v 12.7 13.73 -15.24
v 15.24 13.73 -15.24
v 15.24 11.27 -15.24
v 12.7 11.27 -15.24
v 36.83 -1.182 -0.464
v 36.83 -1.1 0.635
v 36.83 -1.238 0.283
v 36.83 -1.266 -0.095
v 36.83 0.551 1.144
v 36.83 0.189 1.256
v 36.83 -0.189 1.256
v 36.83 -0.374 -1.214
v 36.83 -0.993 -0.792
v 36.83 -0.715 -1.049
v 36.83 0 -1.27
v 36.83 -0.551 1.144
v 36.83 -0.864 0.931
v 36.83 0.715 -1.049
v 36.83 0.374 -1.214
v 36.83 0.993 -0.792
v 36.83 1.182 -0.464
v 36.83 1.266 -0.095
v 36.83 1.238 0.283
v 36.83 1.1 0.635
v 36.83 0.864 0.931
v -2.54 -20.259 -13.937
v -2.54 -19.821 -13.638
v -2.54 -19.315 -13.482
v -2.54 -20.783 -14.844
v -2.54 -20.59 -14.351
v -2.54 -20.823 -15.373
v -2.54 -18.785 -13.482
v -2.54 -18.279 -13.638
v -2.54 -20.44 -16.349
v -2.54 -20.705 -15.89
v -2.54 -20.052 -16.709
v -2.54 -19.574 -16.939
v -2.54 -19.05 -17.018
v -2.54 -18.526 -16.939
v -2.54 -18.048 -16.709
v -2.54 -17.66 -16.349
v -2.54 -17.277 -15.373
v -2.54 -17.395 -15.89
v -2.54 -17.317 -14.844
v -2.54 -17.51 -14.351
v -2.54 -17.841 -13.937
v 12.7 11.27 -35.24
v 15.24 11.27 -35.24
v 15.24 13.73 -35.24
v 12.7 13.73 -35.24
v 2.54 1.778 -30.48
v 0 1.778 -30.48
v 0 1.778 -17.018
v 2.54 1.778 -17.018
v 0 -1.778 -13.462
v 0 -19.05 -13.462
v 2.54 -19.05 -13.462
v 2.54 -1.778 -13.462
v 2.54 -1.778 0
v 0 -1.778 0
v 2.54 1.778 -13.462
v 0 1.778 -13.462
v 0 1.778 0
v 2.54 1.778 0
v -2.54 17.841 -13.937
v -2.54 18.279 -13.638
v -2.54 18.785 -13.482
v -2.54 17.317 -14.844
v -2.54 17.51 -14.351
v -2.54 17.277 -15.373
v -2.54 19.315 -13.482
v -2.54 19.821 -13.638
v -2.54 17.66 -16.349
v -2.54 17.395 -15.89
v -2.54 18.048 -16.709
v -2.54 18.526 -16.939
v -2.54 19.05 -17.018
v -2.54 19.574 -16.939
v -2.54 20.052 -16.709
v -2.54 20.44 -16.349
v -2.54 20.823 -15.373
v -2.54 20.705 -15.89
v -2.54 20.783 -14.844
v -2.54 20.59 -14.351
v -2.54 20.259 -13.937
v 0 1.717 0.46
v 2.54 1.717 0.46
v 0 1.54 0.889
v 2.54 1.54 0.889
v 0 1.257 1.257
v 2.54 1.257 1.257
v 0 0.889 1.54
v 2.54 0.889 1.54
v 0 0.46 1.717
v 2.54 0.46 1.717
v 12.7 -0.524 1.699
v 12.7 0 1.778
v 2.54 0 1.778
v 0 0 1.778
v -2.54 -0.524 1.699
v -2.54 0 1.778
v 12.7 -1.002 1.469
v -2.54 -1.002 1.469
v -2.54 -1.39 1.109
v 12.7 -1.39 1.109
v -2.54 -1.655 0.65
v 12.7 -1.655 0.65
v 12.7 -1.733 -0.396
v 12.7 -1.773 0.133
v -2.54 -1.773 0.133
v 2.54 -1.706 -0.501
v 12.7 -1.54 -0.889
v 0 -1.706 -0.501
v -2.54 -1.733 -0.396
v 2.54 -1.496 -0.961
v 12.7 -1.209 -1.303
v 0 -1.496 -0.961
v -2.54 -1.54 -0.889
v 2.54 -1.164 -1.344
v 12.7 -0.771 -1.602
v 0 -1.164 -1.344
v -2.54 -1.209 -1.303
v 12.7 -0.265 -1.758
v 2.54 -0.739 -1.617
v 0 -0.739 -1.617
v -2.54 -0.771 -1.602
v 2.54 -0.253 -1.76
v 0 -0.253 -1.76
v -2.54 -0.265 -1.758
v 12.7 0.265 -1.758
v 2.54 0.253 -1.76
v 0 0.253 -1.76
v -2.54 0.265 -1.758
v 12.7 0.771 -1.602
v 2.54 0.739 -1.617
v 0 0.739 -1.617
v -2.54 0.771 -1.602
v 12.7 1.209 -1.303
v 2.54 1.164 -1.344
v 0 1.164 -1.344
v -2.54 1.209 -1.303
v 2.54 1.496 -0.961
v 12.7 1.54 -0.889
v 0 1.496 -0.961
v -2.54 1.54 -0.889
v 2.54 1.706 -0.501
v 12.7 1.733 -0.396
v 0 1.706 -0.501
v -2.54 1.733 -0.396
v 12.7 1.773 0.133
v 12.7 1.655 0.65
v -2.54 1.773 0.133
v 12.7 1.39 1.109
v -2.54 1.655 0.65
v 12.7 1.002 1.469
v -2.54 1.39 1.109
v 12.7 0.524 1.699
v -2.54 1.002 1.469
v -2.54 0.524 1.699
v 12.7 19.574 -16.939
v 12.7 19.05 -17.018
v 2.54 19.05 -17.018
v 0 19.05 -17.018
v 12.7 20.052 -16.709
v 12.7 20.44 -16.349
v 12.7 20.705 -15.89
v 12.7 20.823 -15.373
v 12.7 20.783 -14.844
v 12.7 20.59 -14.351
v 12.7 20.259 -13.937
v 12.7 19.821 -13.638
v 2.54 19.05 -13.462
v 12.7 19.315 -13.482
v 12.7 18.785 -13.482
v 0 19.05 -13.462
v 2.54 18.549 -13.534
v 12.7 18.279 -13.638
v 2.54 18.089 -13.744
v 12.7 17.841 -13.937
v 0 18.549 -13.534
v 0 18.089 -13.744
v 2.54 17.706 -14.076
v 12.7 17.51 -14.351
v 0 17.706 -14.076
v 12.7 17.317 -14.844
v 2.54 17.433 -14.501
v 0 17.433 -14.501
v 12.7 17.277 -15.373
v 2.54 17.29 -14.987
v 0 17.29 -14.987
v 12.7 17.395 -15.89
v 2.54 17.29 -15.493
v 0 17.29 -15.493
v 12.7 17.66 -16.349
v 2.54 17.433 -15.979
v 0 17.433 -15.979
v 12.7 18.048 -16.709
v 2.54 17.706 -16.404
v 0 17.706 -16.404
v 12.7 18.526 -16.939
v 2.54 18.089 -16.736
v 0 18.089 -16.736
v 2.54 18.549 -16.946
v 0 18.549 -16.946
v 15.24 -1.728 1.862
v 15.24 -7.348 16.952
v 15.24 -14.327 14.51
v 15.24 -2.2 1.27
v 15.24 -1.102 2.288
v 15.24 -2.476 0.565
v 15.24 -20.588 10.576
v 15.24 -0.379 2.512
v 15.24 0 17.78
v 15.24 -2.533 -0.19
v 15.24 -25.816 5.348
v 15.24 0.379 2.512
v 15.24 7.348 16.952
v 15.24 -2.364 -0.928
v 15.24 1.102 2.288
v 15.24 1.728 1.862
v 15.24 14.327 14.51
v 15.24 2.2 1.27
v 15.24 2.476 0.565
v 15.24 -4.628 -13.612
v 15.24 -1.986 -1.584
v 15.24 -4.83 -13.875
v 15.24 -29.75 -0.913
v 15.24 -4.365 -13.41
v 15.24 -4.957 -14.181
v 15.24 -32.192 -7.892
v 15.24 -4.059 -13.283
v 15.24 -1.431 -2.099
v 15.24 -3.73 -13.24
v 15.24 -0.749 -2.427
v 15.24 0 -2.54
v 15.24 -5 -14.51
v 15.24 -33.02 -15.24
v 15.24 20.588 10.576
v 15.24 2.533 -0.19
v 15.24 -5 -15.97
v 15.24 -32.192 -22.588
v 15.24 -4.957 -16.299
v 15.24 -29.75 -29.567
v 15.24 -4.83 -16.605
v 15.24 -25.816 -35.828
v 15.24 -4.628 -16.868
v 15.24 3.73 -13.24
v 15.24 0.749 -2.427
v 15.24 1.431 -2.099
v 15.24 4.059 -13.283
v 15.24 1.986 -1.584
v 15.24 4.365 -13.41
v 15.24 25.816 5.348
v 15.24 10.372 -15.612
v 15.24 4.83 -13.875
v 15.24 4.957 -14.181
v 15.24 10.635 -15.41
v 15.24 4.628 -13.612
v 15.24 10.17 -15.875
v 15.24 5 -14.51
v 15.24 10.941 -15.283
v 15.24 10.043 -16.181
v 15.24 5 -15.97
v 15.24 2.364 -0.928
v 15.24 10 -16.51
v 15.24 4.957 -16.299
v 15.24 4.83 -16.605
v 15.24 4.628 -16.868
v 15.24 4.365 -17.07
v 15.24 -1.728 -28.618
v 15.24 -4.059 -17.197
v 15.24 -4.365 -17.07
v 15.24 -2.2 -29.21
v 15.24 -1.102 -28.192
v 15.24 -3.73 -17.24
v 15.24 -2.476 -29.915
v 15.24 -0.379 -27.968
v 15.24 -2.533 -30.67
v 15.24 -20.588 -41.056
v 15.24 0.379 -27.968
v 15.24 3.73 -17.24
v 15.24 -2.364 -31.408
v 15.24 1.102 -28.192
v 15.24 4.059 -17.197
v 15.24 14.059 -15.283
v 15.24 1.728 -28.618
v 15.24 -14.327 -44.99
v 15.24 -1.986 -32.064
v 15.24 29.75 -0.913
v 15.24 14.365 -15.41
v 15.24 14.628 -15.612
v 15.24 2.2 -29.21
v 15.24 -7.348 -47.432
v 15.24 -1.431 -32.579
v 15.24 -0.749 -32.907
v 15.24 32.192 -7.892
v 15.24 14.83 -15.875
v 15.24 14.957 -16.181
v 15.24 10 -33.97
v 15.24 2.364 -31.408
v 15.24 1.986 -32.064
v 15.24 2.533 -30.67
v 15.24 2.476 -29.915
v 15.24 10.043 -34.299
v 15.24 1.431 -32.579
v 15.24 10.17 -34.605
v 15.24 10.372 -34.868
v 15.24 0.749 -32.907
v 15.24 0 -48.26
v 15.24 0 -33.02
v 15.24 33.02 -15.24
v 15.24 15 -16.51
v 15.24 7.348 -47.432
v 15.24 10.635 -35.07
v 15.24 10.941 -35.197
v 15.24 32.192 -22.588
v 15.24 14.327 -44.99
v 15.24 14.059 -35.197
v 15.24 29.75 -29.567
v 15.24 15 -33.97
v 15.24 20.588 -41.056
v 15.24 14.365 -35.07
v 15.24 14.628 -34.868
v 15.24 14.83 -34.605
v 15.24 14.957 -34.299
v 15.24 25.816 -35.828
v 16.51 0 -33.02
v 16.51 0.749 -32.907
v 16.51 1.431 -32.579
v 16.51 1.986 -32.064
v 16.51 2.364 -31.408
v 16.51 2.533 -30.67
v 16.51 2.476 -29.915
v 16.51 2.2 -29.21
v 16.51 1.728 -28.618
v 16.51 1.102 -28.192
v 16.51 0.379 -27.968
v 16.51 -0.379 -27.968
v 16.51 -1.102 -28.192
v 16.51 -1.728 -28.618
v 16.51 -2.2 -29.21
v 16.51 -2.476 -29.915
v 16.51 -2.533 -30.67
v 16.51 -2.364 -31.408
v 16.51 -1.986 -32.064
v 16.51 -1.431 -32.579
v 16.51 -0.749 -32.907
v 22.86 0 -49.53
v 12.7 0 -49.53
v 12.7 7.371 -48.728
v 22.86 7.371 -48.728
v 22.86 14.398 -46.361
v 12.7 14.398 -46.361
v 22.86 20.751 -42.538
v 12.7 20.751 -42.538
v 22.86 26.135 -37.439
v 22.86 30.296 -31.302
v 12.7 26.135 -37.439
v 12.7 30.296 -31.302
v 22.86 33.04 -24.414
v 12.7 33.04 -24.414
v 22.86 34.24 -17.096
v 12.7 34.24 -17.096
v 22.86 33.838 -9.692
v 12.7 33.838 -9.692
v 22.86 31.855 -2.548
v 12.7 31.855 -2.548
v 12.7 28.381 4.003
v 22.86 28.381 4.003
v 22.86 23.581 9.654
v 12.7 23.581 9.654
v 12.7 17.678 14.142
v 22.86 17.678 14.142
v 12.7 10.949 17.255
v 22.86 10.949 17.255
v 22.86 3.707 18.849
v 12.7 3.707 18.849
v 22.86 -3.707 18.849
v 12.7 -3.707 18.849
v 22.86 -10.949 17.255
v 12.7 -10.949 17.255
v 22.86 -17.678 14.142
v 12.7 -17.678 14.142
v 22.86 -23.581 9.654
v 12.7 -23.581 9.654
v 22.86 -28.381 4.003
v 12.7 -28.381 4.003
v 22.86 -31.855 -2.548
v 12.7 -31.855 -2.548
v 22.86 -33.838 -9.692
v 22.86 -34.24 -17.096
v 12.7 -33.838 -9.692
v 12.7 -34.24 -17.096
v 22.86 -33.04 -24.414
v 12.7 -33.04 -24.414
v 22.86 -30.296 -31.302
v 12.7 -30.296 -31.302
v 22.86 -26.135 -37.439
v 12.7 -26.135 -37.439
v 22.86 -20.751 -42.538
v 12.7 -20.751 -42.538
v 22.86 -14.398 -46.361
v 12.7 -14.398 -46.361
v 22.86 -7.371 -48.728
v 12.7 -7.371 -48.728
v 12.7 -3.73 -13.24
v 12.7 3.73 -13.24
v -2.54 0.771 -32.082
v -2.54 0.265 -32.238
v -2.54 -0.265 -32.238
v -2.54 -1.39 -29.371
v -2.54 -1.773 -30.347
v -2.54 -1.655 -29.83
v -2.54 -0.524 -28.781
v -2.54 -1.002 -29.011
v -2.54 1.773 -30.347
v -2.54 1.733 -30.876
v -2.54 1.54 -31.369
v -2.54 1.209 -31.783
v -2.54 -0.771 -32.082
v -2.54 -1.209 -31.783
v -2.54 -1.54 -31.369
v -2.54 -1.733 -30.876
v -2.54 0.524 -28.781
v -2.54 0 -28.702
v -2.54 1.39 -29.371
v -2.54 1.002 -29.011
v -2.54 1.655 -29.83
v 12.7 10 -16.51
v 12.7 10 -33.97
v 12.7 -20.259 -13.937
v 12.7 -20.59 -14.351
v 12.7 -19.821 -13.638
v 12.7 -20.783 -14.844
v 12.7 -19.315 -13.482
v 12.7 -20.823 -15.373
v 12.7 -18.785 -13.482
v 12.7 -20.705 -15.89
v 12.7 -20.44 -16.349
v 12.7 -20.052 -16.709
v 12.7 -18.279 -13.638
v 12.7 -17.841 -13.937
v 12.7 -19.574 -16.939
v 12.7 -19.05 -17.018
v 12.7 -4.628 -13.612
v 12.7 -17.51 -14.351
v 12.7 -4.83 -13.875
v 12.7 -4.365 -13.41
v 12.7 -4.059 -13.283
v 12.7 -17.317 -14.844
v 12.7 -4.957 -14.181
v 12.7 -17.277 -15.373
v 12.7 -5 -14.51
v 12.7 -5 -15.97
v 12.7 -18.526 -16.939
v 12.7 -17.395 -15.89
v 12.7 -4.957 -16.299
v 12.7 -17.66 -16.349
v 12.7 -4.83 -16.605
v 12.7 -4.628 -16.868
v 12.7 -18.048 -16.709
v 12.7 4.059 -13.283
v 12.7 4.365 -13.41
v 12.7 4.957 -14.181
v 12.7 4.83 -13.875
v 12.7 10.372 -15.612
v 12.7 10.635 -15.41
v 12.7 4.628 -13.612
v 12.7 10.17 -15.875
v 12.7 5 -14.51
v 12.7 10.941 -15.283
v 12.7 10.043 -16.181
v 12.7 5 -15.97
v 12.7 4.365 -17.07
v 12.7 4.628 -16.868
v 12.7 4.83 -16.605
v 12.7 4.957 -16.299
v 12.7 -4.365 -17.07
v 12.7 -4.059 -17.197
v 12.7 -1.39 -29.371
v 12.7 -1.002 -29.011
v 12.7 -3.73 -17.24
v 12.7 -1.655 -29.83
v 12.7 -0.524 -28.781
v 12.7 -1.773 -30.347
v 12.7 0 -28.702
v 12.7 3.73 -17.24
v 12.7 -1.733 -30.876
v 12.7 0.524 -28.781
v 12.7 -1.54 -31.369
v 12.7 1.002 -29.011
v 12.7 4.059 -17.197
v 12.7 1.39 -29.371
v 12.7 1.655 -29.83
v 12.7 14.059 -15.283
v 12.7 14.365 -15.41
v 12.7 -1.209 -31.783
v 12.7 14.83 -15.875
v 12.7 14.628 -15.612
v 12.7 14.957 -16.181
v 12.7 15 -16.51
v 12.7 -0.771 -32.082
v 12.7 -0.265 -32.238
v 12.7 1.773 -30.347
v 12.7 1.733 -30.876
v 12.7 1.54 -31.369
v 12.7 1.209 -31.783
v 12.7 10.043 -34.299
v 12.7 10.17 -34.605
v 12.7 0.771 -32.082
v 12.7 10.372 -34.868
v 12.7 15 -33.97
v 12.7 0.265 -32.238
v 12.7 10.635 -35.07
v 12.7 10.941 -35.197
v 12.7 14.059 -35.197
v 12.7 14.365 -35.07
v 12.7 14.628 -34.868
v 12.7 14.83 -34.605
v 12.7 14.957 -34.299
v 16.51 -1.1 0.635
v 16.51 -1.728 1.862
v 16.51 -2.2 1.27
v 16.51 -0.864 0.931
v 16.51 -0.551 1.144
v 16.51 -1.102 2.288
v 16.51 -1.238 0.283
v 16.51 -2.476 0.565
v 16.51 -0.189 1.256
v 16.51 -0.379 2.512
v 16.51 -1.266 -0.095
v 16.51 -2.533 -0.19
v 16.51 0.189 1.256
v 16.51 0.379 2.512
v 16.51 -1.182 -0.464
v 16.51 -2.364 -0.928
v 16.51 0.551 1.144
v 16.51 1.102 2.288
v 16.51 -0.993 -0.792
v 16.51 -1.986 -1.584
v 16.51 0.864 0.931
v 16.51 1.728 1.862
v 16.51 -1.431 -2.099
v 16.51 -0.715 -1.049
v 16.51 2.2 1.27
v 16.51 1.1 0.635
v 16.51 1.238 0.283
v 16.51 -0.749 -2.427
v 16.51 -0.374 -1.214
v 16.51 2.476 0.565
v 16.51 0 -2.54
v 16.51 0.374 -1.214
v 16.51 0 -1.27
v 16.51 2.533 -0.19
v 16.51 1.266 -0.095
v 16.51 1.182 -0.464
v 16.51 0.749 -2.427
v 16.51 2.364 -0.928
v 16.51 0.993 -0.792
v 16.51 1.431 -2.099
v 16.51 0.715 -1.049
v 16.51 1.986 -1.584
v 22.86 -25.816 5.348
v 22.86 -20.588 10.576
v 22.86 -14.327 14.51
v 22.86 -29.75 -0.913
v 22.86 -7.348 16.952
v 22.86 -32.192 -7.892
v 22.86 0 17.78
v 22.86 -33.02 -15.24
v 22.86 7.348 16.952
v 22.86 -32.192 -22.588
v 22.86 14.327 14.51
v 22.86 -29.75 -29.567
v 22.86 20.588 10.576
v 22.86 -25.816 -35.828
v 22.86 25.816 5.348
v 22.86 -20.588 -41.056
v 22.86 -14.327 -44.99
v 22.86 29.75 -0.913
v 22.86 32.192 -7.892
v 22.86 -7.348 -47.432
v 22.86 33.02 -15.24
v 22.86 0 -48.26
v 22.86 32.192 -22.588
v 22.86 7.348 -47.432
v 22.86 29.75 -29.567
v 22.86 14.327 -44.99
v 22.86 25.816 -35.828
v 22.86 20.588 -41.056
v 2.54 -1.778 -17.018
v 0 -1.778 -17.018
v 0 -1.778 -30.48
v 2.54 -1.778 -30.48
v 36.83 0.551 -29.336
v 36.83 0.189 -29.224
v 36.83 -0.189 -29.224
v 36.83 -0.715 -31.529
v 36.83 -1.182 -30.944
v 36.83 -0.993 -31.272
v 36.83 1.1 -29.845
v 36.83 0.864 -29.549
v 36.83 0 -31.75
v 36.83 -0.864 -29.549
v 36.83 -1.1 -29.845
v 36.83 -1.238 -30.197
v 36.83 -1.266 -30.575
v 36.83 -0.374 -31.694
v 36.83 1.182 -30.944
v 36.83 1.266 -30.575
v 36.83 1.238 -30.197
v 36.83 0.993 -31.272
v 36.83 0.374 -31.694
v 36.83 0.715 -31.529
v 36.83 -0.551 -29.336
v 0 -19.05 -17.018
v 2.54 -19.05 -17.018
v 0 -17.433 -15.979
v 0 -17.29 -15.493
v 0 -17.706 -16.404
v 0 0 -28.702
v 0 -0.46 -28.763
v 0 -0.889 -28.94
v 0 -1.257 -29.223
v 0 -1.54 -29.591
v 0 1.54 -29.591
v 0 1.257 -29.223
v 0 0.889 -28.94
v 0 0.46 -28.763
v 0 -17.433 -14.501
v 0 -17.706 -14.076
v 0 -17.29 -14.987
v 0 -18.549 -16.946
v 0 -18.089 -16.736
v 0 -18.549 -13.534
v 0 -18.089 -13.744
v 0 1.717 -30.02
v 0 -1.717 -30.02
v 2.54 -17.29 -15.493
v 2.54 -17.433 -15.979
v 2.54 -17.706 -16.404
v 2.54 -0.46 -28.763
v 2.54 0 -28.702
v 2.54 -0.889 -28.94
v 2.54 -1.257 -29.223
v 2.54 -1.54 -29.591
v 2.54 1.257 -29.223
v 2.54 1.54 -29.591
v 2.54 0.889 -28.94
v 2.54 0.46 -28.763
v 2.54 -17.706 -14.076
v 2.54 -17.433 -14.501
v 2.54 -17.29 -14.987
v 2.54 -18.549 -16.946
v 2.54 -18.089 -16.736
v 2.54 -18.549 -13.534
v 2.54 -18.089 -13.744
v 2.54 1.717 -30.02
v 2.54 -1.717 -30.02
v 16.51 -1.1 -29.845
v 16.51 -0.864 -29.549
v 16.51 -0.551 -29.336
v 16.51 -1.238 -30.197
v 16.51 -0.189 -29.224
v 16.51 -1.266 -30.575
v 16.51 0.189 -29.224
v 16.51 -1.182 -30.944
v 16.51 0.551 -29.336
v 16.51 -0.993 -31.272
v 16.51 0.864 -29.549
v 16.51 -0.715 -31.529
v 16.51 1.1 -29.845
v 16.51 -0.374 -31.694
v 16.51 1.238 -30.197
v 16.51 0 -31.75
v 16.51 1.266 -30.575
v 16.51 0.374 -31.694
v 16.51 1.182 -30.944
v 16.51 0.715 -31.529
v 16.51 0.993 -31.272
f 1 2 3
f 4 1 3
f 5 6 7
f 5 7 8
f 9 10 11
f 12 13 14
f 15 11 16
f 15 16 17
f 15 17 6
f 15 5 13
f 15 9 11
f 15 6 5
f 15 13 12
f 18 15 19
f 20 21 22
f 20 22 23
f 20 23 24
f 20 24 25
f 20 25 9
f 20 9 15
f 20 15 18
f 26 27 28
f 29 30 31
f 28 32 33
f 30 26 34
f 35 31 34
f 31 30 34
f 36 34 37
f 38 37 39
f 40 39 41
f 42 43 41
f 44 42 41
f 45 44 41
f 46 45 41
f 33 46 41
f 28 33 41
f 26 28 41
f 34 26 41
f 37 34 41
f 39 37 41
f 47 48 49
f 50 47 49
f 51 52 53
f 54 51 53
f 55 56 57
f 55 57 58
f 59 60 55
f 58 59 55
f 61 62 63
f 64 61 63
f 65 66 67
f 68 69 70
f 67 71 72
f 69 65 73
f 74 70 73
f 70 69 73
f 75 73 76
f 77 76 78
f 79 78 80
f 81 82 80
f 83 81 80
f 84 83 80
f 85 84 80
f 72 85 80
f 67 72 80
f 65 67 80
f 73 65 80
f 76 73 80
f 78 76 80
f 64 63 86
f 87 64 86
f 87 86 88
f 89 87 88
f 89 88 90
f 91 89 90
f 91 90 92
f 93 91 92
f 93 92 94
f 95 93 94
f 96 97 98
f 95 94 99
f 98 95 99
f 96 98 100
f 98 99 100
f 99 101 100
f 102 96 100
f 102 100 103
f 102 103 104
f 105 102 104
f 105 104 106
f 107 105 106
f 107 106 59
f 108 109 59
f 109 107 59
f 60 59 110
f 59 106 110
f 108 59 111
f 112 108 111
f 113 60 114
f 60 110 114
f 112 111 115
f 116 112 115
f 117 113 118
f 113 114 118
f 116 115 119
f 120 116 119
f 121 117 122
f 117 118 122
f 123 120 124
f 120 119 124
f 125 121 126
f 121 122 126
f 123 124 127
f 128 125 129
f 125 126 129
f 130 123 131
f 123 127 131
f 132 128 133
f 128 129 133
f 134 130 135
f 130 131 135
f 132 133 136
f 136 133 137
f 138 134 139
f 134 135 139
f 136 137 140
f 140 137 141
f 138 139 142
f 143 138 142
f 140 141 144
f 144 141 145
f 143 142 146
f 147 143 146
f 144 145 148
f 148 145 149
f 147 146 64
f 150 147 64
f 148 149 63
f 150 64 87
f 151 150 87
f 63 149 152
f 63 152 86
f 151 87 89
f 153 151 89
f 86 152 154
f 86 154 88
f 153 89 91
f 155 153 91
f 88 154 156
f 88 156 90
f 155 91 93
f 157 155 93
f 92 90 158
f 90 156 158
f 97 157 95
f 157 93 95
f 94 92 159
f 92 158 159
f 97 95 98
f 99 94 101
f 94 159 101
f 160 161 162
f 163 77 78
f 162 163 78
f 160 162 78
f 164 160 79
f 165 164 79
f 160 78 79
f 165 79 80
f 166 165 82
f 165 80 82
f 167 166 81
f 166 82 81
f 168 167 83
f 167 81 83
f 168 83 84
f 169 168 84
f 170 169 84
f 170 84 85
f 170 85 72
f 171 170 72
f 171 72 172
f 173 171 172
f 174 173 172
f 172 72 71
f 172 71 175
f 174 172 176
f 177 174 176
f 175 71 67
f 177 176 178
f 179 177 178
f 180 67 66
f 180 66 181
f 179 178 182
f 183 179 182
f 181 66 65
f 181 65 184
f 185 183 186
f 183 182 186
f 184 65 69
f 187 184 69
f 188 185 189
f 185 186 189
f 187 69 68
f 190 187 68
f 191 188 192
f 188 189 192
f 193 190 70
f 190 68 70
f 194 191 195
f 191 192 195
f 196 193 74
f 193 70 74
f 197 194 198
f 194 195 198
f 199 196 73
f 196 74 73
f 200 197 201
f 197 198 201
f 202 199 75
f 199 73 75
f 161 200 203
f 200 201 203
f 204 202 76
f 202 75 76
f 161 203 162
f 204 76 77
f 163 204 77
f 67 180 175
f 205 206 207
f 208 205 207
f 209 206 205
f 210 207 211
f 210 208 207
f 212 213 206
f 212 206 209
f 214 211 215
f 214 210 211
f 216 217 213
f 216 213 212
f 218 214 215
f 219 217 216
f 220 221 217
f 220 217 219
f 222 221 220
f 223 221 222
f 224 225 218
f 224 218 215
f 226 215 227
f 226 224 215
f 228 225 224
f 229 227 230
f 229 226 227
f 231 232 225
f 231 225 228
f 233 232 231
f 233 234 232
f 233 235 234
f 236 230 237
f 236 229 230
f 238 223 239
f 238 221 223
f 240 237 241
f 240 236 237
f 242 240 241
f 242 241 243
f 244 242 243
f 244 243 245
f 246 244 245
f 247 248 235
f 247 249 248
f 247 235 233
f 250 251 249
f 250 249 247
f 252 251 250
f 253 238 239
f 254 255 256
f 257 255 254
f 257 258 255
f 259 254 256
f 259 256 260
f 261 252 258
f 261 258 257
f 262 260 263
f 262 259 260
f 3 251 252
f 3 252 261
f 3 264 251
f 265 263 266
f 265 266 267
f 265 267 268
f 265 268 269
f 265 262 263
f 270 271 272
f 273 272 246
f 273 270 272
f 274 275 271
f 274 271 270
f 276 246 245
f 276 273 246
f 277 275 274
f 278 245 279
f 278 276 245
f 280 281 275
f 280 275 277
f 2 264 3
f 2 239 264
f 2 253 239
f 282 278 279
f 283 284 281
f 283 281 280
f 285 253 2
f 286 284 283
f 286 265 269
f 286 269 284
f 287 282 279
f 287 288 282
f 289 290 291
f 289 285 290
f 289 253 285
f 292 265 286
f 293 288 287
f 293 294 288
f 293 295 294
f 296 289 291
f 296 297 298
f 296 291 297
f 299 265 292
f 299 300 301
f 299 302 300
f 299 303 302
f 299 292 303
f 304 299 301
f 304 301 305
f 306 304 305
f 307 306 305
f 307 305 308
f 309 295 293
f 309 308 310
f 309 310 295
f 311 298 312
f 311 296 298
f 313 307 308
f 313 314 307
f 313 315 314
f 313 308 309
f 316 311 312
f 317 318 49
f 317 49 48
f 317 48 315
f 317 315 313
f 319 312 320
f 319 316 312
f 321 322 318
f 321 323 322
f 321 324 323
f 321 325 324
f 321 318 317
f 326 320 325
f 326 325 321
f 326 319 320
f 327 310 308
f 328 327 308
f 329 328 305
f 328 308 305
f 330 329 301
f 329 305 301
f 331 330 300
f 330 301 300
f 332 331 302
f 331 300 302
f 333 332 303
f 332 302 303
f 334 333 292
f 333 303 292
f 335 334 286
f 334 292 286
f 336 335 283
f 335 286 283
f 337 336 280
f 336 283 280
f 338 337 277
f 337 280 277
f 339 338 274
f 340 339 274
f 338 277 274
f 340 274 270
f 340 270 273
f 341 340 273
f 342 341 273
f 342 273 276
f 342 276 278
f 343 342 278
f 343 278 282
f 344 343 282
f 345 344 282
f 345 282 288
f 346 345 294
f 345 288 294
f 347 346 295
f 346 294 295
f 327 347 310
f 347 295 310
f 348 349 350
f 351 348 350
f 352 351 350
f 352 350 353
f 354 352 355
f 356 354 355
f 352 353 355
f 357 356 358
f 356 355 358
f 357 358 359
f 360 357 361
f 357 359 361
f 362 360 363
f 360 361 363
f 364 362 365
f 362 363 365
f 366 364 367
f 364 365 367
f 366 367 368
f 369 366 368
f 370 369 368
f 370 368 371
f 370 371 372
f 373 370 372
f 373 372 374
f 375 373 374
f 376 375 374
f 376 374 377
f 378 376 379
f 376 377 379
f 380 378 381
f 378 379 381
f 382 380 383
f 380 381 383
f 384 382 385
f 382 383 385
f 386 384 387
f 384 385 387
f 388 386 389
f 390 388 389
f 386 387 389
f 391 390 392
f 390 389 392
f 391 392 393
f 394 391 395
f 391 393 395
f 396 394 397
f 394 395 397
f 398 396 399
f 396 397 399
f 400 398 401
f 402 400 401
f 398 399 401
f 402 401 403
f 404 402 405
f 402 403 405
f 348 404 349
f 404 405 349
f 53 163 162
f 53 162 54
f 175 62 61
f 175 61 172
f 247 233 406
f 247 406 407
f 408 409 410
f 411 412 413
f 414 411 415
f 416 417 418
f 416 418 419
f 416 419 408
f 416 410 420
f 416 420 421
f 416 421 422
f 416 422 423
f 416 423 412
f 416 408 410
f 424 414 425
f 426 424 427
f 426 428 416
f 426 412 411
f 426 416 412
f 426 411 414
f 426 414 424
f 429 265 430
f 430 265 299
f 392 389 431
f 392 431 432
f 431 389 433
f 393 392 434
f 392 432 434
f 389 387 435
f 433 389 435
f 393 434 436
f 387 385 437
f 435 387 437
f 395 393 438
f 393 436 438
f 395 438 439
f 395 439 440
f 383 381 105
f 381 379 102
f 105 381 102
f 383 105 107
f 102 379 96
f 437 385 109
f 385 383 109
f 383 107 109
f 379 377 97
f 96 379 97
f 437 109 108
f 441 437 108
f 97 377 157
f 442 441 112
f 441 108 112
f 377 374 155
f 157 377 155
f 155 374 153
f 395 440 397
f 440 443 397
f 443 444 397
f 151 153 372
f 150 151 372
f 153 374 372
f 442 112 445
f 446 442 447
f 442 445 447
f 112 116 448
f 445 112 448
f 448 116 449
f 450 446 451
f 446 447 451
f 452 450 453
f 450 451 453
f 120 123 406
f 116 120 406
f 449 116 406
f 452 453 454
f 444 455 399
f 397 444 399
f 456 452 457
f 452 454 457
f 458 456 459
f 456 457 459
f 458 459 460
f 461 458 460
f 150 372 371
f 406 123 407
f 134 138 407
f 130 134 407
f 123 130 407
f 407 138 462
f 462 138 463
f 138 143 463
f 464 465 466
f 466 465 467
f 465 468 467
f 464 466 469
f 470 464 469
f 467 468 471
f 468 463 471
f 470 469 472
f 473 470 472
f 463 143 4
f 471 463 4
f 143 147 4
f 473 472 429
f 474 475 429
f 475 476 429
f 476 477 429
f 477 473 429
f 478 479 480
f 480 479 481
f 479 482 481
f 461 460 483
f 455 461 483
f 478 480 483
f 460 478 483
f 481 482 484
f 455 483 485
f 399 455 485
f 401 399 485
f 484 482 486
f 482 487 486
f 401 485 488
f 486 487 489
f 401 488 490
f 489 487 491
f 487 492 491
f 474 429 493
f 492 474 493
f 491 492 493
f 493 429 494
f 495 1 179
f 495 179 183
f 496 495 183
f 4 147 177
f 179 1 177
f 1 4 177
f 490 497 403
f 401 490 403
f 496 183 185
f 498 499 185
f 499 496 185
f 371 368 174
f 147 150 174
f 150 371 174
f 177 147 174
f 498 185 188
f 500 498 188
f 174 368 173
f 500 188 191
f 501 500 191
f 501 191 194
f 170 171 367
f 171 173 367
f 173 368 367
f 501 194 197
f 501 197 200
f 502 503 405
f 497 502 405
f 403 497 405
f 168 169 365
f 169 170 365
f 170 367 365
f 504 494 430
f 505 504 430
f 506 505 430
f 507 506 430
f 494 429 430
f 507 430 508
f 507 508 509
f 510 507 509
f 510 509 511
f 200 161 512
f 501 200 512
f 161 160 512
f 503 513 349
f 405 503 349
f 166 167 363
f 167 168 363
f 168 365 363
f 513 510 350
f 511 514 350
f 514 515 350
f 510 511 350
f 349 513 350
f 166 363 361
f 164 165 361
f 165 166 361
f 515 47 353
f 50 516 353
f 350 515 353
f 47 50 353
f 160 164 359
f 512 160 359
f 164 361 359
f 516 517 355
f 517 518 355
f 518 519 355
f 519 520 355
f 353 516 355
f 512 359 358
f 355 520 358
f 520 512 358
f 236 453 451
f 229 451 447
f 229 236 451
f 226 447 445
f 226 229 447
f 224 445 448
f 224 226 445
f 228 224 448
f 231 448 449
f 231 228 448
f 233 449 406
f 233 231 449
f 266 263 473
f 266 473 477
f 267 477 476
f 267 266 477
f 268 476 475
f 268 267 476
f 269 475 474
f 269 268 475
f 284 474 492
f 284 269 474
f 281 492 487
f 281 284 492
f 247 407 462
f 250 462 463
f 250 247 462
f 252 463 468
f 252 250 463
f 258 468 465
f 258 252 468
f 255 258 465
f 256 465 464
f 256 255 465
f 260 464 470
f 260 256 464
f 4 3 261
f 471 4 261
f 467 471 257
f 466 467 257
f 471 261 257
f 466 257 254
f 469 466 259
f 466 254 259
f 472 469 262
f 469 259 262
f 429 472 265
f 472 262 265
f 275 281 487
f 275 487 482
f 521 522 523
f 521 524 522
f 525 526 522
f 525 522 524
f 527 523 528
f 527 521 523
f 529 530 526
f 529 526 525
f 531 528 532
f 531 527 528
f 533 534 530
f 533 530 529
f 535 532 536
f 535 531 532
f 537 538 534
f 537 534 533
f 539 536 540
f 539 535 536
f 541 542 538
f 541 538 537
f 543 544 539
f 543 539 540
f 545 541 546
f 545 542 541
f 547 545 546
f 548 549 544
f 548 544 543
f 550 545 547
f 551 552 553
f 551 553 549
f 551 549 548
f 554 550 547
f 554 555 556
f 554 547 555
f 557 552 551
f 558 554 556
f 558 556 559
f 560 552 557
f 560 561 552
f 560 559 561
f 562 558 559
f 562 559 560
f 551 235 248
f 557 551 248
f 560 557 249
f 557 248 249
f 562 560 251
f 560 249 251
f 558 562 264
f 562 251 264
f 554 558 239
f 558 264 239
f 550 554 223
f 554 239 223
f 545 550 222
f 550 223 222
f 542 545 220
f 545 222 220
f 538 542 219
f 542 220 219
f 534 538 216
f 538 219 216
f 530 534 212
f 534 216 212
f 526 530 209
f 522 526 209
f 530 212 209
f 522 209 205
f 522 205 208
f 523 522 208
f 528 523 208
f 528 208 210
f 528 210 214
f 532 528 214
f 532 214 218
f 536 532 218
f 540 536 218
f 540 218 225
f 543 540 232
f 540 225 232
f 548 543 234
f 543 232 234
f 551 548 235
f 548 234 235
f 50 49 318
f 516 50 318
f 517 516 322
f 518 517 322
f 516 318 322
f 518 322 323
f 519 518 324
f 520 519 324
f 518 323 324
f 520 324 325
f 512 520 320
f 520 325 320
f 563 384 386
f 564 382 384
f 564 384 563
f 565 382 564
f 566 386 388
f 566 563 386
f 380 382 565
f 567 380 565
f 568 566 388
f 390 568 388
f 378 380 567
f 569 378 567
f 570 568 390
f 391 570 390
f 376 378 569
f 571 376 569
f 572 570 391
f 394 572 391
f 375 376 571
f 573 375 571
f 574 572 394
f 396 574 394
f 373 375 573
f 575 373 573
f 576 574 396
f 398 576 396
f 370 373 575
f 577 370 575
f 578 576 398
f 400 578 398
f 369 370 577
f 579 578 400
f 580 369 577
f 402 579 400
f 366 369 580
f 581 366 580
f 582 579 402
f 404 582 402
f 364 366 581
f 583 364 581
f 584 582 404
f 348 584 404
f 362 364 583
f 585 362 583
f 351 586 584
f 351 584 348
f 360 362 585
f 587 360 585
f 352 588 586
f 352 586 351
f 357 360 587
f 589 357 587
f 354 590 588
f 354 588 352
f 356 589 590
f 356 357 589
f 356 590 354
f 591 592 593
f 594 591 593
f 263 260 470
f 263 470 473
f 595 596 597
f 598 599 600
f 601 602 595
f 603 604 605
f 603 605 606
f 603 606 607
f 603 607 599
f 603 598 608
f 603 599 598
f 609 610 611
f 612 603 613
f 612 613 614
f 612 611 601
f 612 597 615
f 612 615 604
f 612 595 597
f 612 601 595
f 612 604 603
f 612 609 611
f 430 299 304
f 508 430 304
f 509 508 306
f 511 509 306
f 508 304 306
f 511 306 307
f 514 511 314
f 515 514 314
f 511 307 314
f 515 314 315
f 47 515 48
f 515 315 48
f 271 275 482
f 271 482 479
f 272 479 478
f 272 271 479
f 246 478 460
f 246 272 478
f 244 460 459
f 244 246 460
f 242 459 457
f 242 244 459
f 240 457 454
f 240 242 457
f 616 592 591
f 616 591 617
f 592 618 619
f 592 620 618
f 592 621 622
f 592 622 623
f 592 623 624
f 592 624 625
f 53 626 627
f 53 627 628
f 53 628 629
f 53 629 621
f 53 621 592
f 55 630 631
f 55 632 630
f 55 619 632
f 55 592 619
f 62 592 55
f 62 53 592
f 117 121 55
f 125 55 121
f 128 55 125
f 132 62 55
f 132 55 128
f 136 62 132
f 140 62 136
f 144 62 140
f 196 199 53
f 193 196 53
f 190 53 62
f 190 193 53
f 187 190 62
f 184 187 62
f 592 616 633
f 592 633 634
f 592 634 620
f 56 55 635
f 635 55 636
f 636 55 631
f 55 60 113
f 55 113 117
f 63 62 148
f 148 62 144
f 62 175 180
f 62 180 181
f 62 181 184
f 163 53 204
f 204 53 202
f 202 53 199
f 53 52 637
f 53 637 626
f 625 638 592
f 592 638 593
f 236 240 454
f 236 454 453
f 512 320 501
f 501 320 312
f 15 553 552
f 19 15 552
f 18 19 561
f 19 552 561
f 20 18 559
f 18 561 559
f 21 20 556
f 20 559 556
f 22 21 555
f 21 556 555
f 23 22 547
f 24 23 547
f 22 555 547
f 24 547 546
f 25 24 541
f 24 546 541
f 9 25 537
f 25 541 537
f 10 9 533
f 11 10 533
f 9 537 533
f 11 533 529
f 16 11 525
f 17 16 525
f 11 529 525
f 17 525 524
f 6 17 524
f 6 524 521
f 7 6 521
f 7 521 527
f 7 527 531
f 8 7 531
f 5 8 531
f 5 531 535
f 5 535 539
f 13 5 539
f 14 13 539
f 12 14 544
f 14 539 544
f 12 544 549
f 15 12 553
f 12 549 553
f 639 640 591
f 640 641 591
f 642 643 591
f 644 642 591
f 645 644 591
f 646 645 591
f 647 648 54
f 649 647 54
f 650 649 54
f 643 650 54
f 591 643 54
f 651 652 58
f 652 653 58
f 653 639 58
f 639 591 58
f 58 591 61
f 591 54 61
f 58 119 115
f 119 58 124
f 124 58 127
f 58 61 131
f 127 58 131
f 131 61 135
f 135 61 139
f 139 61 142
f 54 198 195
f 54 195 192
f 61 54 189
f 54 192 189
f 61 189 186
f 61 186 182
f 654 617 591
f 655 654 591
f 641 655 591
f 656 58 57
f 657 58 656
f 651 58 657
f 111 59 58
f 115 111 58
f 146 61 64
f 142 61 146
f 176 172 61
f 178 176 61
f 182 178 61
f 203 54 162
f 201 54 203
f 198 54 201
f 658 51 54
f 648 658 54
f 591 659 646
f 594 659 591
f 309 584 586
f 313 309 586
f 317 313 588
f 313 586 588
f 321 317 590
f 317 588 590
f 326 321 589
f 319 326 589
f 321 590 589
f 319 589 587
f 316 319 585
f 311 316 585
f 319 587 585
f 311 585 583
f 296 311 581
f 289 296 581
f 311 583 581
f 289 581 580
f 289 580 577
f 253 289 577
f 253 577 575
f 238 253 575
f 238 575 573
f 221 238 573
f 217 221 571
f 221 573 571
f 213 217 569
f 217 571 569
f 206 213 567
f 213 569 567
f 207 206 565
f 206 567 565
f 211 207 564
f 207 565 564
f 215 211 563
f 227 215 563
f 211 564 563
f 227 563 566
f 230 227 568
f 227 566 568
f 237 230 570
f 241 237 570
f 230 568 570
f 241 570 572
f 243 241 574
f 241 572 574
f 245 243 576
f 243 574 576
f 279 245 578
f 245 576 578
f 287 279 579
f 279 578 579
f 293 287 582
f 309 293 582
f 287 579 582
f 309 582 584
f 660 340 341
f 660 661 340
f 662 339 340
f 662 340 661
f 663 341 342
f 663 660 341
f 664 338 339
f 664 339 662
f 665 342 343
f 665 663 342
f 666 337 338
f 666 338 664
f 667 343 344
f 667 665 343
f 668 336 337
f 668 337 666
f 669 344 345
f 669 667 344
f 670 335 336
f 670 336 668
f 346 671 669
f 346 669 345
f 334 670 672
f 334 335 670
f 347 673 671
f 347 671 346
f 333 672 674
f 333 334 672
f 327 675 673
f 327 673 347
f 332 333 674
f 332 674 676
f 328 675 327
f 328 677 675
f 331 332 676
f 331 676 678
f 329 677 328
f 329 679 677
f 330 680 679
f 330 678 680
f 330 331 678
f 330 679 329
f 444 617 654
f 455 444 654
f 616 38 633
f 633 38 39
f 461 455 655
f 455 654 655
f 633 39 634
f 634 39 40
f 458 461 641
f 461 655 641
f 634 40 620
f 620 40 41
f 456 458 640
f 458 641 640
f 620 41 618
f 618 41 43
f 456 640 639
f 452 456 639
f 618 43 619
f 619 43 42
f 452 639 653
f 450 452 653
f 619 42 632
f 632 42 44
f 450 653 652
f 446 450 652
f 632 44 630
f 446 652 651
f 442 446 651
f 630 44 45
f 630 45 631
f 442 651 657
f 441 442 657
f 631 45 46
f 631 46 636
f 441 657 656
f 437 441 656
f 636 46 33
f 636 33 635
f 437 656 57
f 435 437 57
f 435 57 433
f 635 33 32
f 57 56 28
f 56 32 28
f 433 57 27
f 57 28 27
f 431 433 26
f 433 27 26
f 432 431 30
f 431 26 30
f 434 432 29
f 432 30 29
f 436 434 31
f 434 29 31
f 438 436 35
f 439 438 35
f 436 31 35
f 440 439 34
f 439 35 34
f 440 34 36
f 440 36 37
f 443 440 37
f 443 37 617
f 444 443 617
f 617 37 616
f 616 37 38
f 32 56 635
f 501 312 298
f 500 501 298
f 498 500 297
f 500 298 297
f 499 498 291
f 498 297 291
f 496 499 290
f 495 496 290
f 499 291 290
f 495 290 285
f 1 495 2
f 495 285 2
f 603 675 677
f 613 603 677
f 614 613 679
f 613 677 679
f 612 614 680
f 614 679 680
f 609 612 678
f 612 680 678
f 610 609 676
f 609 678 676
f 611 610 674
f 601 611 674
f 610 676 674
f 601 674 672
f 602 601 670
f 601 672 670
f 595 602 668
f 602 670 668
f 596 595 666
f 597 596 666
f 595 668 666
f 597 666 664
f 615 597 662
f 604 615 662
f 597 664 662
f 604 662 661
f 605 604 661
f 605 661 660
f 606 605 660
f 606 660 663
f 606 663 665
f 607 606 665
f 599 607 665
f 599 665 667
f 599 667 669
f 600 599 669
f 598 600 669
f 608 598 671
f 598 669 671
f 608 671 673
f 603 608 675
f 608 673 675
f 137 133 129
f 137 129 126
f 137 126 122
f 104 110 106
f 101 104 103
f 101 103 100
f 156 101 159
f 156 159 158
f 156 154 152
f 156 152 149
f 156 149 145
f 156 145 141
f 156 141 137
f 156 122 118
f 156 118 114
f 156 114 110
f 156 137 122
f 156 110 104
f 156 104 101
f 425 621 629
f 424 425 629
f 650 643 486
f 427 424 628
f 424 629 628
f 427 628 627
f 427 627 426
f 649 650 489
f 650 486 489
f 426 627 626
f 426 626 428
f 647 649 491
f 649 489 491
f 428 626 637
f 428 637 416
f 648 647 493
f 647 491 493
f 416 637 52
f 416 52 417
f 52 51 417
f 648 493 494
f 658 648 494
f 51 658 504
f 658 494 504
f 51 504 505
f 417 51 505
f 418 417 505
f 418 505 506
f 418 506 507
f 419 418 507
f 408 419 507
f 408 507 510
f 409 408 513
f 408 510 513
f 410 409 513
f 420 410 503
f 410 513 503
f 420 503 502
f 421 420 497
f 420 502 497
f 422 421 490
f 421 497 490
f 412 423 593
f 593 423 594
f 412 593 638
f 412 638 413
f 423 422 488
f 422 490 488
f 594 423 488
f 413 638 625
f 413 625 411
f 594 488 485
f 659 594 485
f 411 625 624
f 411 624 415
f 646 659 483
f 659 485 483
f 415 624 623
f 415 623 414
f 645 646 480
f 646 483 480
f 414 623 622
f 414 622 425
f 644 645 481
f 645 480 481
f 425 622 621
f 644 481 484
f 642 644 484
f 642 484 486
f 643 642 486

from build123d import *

# Parameters (mm, degrees)
BOSS_EXTRUDE1_DEPTH      = 2.54
BOSS_EXTRUDE2_DEPTH      = 2.54
BOSS_EXTRUDE2_DEPTH_BACK = 12.7
SKETCH3_R                = 1.778
SKETCH4_R                = 34.29
BOSS_EXTRUDE3_DEPTH      = 10.16
BOSS_EXTRUDE4_DEPTH      = 2.54
BOSS_EXTRUDE5_DEPTH      = 10.16
BOSS_EXTRUDE5_DEPTH_BACK = 5.08
SKETCH6_R                = 1.778
SKETCH7_R                = 33.02
CUT_EXTRUDE1_DEPTH       = 7.62
SKETCH9_R                = 2.54
BOSS_EXTRUDE6_DEPTH      = 1.27
SKETCH10_R               = 1.27
BOSS_EXTRUDE7_DEPTH      = 20.32
CUT_EXTRUDE2_REACH       = 65.993
CUT_EXTRUDE3_REACH       = 65.993


with BuildPart() as part:
    # Sketch2 → Boss-Extrude1 (new body)
    with BuildSketch(Plane(origin=(0, 0, 0), x_dir=(0, 0, -1), z_dir=(1, 0, 0))):
        with BuildLine():
            Line((0, -1.778), (30.48, -1.778))
            ThreePointArc((30.48, -1.778), (32.258, 0), (30.48, 1.778))
            Line((30.48, 1.778), (0, 1.778))
            ThreePointArc((0, 1.778), (-1.778, 0), (0, -1.778))
        make_face()
    extrude(amount=BOSS_EXTRUDE1_DEPTH)

    # Sketch3 → Boss-Extrude2 (add, two sides: drawn at the far end of the back side and taken through both)
    with BuildSketch(Plane.ZY.offset(-BOSS_EXTRUDE2_DEPTH_BACK)):
        with Locations((-30.48, 0)):
            Circle(SKETCH3_R)
        Circle(SKETCH3_R)
    extrude(amount=BOSS_EXTRUDE2_DEPTH + BOSS_EXTRUDE2_DEPTH_BACK)

    # Sketch4 → Boss-Extrude3 (add)
    with BuildSketch(Plane(origin=(12.7, 0, 0), x_dir=(0, 0, -1), z_dir=(1, 0, 0))):
        with Locations((15.24, 0)):
            Circle(SKETCH4_R)
    extrude(amount=BOSS_EXTRUDE3_DEPTH)

    # Sketch5 → Boss-Extrude4 (add)
    with BuildSketch(Plane(origin=(0, 0, 0), x_dir=(0, 0, -1), z_dir=(1, 0, 0))):
        with BuildLine():
            Line((13.462, -19.05), (13.462, 19.05))
            ThreePointArc((13.462, 19.05), (15.24, 20.828), (17.018, 19.05))
            Line((17.018, 19.05), (17.018, -19.05))
            ThreePointArc((17.018, -19.05), (15.24, -20.828), (13.462, -19.05))
        make_face()
    extrude(amount=BOSS_EXTRUDE4_DEPTH)

    # Sketch6 → Boss-Extrude5 (add, two sides: drawn at the far end of the back side and taken through both)
    with BuildSketch(Plane(origin=(2.54, 0, 0), x_dir=(0, 0, -1), z_dir=(1, 0, 0)).offset(-BOSS_EXTRUDE5_DEPTH_BACK)):
        with Locations((15.24, -19.05)):
            Circle(SKETCH6_R)
        with Locations((15.24, 19.05)):
            Circle(SKETCH6_R)
    extrude(amount=BOSS_EXTRUDE5_DEPTH + BOSS_EXTRUDE5_DEPTH_BACK)

    # Sketch7 → Cut-Extrude1 (cut)
    with BuildSketch(Plane(origin=(22.86, 0, 0), x_dir=(0, 0, -1), z_dir=(1, 0, 0))):
        with Locations((15.24, 0)):
            Circle(SKETCH7_R)
    extrude(amount=-CUT_EXTRUDE1_DEPTH, mode=Mode.SUBTRACT)

    # Sketch9 → Boss-Extrude6 (add)
    with BuildSketch(Plane(origin=(15.24, 0, 0), x_dir=(0, 0, -1), z_dir=(1, 0, 0))):
        Circle(SKETCH9_R)
        with Locations((30.48, 0)):
            Circle(SKETCH9_R)
    extrude(amount=BOSS_EXTRUDE6_DEPTH)

    # Sketch10 → Boss-Extrude7 (add)
    with BuildSketch(Plane(origin=(16.51, 0, 0), x_dir=(0, 0, -1), z_dir=(1, 0, 0))):
        with Locations((30.48, 0)):
            Circle(SKETCH10_R)
        Circle(SKETCH10_R)
    extrude(amount=BOSS_EXTRUDE7_DEPTH)

    # Sketch11 → Cut-Extrude2 (cut, up to next)
    with BuildSketch(Plane(origin=(15.24, 0, 0), x_dir=(0, 0, -1), z_dir=(1, 0, 0)), mode=Mode.PRIVATE) as cut_extrude2_sk1:
        with BuildLine():
            Line((14.51, 5), (15.97, 5))
            ThreePointArc((15.97, 5), (16.868025612, 4.628025612), (17.24, 3.73))
            Line((17.24, 3.73), (17.24, -3.73))
            ThreePointArc((17.24, -3.73), (16.868025612, -4.628025612), (15.97, -5))
            Line((15.97, -5), (14.51, -5))
            ThreePointArc((14.51, -5), (13.611974388, -4.628025612), (13.24, -3.73))
            Line((13.24, -3.73), (13.24, 3.73))
            ThreePointArc((13.24, 3.73), (13.611974388, 4.628025612), (14.51, 5))
        make_face()
    cut_extrude2_tool1 = extrude(cut_extrude2_sk1.sketch, amount=-CUT_EXTRUDE2_REACH, mode=Mode.PRIVATE) & part.part
    add(cut_extrude2_tool1.solids().sort_by_distance((15.24, 0, -15.24))[0], mode=Mode.SUBTRACT)

    # Sketch15 → Cut-Extrude3 (cut, up to next)
    with BuildSketch(Plane(origin=(15.24, 0, 0), x_dir=(0, 0, -1), z_dir=(1, 0, 0)), mode=Mode.PRIVATE) as cut_extrude3_sk1:
        with BuildLine():
            Line((16.51, 10), (33.97, 10))
            ThreePointArc((33.97, 10), (34.868025612, 10.371974388), (35.24, 11.27))
            Line((35.24, 11.27), (35.24, 13.73))
            ThreePointArc((35.24, 13.73), (34.868025612, 14.628025612), (33.97, 15))
            Line((33.97, 15), (16.51, 15))
            ThreePointArc((16.51, 15), (15.611974388, 14.628025612), (15.24, 13.73))
            Line((15.24, 13.73), (15.24, 11.27))
            ThreePointArc((15.24, 11.27), (15.611974388, 10.371974388), (16.51, 10))
        make_face()
    cut_extrude3_tool1 = extrude(cut_extrude3_sk1.sketch, amount=-CUT_EXTRUDE3_REACH, mode=Mode.PRIVATE) & part.part
    add(cut_extrude3_tool1.solids().sort_by_distance((15.24, 12.5, -25.24))[0], mode=Mode.SUBTRACT)


solid = part.part
